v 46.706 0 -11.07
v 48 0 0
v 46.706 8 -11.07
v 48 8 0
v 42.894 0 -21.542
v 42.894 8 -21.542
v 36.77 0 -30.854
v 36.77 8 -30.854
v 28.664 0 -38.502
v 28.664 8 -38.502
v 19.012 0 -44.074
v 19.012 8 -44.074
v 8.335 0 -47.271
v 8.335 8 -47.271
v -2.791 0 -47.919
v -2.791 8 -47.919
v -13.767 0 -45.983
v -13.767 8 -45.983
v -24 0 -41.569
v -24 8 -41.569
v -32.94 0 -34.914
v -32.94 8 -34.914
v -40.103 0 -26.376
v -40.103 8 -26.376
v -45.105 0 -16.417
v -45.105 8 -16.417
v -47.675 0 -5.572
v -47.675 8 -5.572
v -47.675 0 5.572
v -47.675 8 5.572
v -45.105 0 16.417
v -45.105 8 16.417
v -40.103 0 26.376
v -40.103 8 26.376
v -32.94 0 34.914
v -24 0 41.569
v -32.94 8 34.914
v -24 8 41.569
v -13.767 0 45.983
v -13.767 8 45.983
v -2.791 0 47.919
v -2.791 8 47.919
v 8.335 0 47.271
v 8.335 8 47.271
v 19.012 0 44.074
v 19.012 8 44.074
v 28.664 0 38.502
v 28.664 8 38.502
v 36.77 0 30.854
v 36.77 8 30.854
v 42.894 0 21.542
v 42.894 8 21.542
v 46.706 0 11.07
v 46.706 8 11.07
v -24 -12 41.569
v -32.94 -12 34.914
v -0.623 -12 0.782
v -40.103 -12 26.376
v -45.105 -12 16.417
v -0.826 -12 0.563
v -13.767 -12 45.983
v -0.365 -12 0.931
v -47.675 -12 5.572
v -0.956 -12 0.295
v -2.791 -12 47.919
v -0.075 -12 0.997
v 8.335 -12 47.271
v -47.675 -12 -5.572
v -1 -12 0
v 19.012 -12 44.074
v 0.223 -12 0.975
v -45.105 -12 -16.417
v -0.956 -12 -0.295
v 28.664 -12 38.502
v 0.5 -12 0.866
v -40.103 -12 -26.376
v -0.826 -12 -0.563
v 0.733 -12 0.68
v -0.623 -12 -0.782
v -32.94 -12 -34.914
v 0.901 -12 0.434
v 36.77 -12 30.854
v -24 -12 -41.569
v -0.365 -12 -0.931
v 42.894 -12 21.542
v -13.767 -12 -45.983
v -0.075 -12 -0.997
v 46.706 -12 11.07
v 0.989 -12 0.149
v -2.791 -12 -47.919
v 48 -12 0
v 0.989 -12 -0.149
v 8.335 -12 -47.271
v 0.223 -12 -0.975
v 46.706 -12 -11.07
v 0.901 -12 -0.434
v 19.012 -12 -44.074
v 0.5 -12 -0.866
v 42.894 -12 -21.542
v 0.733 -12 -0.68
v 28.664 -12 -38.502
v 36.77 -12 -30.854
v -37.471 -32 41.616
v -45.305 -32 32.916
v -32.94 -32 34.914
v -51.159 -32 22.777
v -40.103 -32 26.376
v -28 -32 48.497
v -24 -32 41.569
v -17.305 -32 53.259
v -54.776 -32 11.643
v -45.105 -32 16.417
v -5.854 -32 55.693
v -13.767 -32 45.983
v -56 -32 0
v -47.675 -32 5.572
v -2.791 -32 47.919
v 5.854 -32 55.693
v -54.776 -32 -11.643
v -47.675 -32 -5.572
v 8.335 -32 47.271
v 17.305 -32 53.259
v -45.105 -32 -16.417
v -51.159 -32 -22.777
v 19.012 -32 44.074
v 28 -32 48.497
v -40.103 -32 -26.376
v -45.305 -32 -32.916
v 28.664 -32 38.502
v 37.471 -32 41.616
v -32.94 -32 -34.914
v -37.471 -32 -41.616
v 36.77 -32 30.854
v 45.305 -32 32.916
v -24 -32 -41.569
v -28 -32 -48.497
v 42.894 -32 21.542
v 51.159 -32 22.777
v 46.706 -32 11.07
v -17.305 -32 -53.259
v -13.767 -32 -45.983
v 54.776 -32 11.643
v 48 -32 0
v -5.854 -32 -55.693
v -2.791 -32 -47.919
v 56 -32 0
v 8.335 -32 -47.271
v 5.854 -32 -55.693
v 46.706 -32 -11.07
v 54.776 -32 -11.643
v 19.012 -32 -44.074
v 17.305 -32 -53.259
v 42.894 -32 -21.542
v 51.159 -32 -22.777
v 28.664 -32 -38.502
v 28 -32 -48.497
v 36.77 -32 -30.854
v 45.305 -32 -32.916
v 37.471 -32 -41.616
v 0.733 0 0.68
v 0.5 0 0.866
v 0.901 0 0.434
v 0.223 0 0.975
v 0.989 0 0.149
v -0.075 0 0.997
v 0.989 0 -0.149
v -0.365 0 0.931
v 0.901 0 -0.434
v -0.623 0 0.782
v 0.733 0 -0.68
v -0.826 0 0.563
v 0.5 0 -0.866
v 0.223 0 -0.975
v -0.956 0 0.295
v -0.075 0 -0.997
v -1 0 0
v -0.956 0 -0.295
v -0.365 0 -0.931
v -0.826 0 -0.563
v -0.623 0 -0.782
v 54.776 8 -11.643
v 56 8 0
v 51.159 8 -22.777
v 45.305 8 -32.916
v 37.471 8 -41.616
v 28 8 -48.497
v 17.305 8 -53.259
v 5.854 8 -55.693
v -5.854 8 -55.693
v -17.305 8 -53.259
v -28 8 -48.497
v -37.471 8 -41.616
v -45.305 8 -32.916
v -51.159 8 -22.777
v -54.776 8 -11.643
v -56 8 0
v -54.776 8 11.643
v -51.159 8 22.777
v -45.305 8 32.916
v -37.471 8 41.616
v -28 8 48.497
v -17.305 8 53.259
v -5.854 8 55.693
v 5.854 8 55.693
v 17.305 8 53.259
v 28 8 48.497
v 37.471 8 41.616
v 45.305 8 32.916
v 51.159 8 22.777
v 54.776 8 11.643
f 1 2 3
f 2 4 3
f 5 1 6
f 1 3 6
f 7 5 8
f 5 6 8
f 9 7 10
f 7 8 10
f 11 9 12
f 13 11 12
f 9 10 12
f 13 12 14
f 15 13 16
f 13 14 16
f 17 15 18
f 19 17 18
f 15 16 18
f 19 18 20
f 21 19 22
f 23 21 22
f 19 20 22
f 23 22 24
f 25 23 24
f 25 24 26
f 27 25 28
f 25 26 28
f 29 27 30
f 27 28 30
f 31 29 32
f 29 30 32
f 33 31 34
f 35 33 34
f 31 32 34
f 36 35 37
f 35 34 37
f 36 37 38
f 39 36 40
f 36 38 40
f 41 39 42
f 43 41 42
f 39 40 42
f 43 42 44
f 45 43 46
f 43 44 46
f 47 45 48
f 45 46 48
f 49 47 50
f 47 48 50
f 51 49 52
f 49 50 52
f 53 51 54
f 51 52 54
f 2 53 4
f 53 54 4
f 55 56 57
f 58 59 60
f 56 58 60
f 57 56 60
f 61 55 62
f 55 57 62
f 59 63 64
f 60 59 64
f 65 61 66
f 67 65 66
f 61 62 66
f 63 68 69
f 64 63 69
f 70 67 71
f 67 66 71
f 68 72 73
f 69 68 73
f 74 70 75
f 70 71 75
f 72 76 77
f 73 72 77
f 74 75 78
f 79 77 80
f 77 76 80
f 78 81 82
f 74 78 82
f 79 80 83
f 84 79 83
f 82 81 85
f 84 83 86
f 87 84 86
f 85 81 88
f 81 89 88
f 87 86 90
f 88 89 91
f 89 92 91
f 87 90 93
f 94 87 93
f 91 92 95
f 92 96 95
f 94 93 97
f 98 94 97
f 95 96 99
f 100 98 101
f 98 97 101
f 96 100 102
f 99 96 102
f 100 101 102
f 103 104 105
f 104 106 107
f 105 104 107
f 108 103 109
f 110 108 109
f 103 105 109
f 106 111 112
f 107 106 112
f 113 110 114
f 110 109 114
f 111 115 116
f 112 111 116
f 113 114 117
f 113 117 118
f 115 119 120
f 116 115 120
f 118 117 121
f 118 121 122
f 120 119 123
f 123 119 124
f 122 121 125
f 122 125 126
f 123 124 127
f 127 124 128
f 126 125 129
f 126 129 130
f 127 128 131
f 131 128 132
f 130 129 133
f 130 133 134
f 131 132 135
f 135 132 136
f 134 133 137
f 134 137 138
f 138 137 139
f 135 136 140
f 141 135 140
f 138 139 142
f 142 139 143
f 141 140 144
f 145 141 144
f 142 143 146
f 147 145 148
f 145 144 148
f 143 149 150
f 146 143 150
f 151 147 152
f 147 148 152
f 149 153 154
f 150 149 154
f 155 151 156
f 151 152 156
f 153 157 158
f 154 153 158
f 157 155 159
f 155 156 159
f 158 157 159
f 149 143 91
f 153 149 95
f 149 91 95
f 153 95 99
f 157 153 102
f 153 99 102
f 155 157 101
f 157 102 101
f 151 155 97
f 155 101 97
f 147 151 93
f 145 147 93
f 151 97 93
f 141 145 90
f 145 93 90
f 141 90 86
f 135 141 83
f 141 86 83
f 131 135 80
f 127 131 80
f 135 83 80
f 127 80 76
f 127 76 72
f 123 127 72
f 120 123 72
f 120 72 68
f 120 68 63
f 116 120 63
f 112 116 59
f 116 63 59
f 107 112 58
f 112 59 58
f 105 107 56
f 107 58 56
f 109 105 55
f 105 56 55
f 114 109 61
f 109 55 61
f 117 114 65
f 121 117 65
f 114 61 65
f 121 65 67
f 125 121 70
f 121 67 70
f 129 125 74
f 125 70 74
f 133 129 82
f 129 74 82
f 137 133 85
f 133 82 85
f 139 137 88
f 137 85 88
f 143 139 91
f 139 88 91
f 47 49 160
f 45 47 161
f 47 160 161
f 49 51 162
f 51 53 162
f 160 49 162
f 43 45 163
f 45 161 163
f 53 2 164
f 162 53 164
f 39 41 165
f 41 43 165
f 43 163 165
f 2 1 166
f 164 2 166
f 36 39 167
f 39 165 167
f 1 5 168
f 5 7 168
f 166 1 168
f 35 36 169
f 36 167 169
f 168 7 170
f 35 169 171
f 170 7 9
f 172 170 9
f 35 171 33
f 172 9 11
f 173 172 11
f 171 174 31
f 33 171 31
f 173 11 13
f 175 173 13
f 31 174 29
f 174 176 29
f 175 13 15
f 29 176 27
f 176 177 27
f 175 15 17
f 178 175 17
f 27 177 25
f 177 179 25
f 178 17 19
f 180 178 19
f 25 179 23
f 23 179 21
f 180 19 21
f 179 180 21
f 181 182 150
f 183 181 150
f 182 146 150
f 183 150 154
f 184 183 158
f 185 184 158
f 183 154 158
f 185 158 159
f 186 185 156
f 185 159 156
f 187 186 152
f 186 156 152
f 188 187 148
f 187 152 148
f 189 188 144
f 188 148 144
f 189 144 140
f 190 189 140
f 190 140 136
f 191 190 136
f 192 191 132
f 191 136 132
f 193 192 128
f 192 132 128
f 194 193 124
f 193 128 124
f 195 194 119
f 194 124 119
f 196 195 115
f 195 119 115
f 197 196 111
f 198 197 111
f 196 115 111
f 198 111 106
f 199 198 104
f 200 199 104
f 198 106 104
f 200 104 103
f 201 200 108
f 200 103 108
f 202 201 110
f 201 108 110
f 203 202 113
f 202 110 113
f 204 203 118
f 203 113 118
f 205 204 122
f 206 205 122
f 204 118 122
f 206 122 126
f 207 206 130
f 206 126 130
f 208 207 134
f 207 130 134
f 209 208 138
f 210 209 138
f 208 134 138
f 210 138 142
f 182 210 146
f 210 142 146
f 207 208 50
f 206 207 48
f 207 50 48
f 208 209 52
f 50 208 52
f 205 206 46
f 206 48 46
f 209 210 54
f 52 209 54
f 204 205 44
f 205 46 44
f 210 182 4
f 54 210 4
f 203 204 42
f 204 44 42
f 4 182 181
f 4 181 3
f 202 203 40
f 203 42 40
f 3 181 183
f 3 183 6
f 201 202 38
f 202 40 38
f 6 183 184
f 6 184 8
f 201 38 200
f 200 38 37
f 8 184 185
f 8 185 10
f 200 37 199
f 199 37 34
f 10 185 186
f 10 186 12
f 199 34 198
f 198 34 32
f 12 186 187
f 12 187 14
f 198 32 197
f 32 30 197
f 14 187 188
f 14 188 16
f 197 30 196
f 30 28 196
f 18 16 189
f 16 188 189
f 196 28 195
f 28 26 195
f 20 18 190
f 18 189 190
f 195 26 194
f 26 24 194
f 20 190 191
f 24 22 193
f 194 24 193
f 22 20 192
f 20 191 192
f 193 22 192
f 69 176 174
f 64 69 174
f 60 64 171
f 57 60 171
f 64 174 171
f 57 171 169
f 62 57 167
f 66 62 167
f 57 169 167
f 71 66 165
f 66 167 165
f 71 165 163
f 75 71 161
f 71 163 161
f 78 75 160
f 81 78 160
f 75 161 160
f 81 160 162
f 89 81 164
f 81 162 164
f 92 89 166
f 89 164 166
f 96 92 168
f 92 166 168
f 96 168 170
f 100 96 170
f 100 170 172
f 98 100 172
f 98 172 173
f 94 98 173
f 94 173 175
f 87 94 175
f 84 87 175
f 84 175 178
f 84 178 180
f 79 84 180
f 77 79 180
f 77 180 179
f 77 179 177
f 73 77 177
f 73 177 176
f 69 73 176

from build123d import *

# Parameters (mm, degrees)
SKETCH3_R                       = 1
HOLE_FOR_SCREW_BLADE_CASE_DEPTH = 100


with BuildPart() as part:
    # Sketch2 → Blade Casing Revolve (revolve)
    with BuildSketch(Plane.XY):
        Polygon((0, 0), (48, 0), (48, 8), (56, 8), (56, -32), (48, -32), (48, -12), (0, -12), align=None)
    revolve(axis=Axis((0, -12, 0), (0, 1, 0)))

    # Sketch3 → Hole for Screw (Blade Case) (cut)
    with BuildSketch(Plane(origin=(0, 0, 0), x_dir=(1, 0, 0), z_dir=(0, 1, 0))):
        with Locations(Location((0, 0, 0), (0, 0, 180))):
            Circle(SKETCH3_R)
    extrude(amount=-HOLE_FOR_SCREW_BLADE_CASE_DEPTH, mode=Mode.SUBTRACT)


solid = part.part
